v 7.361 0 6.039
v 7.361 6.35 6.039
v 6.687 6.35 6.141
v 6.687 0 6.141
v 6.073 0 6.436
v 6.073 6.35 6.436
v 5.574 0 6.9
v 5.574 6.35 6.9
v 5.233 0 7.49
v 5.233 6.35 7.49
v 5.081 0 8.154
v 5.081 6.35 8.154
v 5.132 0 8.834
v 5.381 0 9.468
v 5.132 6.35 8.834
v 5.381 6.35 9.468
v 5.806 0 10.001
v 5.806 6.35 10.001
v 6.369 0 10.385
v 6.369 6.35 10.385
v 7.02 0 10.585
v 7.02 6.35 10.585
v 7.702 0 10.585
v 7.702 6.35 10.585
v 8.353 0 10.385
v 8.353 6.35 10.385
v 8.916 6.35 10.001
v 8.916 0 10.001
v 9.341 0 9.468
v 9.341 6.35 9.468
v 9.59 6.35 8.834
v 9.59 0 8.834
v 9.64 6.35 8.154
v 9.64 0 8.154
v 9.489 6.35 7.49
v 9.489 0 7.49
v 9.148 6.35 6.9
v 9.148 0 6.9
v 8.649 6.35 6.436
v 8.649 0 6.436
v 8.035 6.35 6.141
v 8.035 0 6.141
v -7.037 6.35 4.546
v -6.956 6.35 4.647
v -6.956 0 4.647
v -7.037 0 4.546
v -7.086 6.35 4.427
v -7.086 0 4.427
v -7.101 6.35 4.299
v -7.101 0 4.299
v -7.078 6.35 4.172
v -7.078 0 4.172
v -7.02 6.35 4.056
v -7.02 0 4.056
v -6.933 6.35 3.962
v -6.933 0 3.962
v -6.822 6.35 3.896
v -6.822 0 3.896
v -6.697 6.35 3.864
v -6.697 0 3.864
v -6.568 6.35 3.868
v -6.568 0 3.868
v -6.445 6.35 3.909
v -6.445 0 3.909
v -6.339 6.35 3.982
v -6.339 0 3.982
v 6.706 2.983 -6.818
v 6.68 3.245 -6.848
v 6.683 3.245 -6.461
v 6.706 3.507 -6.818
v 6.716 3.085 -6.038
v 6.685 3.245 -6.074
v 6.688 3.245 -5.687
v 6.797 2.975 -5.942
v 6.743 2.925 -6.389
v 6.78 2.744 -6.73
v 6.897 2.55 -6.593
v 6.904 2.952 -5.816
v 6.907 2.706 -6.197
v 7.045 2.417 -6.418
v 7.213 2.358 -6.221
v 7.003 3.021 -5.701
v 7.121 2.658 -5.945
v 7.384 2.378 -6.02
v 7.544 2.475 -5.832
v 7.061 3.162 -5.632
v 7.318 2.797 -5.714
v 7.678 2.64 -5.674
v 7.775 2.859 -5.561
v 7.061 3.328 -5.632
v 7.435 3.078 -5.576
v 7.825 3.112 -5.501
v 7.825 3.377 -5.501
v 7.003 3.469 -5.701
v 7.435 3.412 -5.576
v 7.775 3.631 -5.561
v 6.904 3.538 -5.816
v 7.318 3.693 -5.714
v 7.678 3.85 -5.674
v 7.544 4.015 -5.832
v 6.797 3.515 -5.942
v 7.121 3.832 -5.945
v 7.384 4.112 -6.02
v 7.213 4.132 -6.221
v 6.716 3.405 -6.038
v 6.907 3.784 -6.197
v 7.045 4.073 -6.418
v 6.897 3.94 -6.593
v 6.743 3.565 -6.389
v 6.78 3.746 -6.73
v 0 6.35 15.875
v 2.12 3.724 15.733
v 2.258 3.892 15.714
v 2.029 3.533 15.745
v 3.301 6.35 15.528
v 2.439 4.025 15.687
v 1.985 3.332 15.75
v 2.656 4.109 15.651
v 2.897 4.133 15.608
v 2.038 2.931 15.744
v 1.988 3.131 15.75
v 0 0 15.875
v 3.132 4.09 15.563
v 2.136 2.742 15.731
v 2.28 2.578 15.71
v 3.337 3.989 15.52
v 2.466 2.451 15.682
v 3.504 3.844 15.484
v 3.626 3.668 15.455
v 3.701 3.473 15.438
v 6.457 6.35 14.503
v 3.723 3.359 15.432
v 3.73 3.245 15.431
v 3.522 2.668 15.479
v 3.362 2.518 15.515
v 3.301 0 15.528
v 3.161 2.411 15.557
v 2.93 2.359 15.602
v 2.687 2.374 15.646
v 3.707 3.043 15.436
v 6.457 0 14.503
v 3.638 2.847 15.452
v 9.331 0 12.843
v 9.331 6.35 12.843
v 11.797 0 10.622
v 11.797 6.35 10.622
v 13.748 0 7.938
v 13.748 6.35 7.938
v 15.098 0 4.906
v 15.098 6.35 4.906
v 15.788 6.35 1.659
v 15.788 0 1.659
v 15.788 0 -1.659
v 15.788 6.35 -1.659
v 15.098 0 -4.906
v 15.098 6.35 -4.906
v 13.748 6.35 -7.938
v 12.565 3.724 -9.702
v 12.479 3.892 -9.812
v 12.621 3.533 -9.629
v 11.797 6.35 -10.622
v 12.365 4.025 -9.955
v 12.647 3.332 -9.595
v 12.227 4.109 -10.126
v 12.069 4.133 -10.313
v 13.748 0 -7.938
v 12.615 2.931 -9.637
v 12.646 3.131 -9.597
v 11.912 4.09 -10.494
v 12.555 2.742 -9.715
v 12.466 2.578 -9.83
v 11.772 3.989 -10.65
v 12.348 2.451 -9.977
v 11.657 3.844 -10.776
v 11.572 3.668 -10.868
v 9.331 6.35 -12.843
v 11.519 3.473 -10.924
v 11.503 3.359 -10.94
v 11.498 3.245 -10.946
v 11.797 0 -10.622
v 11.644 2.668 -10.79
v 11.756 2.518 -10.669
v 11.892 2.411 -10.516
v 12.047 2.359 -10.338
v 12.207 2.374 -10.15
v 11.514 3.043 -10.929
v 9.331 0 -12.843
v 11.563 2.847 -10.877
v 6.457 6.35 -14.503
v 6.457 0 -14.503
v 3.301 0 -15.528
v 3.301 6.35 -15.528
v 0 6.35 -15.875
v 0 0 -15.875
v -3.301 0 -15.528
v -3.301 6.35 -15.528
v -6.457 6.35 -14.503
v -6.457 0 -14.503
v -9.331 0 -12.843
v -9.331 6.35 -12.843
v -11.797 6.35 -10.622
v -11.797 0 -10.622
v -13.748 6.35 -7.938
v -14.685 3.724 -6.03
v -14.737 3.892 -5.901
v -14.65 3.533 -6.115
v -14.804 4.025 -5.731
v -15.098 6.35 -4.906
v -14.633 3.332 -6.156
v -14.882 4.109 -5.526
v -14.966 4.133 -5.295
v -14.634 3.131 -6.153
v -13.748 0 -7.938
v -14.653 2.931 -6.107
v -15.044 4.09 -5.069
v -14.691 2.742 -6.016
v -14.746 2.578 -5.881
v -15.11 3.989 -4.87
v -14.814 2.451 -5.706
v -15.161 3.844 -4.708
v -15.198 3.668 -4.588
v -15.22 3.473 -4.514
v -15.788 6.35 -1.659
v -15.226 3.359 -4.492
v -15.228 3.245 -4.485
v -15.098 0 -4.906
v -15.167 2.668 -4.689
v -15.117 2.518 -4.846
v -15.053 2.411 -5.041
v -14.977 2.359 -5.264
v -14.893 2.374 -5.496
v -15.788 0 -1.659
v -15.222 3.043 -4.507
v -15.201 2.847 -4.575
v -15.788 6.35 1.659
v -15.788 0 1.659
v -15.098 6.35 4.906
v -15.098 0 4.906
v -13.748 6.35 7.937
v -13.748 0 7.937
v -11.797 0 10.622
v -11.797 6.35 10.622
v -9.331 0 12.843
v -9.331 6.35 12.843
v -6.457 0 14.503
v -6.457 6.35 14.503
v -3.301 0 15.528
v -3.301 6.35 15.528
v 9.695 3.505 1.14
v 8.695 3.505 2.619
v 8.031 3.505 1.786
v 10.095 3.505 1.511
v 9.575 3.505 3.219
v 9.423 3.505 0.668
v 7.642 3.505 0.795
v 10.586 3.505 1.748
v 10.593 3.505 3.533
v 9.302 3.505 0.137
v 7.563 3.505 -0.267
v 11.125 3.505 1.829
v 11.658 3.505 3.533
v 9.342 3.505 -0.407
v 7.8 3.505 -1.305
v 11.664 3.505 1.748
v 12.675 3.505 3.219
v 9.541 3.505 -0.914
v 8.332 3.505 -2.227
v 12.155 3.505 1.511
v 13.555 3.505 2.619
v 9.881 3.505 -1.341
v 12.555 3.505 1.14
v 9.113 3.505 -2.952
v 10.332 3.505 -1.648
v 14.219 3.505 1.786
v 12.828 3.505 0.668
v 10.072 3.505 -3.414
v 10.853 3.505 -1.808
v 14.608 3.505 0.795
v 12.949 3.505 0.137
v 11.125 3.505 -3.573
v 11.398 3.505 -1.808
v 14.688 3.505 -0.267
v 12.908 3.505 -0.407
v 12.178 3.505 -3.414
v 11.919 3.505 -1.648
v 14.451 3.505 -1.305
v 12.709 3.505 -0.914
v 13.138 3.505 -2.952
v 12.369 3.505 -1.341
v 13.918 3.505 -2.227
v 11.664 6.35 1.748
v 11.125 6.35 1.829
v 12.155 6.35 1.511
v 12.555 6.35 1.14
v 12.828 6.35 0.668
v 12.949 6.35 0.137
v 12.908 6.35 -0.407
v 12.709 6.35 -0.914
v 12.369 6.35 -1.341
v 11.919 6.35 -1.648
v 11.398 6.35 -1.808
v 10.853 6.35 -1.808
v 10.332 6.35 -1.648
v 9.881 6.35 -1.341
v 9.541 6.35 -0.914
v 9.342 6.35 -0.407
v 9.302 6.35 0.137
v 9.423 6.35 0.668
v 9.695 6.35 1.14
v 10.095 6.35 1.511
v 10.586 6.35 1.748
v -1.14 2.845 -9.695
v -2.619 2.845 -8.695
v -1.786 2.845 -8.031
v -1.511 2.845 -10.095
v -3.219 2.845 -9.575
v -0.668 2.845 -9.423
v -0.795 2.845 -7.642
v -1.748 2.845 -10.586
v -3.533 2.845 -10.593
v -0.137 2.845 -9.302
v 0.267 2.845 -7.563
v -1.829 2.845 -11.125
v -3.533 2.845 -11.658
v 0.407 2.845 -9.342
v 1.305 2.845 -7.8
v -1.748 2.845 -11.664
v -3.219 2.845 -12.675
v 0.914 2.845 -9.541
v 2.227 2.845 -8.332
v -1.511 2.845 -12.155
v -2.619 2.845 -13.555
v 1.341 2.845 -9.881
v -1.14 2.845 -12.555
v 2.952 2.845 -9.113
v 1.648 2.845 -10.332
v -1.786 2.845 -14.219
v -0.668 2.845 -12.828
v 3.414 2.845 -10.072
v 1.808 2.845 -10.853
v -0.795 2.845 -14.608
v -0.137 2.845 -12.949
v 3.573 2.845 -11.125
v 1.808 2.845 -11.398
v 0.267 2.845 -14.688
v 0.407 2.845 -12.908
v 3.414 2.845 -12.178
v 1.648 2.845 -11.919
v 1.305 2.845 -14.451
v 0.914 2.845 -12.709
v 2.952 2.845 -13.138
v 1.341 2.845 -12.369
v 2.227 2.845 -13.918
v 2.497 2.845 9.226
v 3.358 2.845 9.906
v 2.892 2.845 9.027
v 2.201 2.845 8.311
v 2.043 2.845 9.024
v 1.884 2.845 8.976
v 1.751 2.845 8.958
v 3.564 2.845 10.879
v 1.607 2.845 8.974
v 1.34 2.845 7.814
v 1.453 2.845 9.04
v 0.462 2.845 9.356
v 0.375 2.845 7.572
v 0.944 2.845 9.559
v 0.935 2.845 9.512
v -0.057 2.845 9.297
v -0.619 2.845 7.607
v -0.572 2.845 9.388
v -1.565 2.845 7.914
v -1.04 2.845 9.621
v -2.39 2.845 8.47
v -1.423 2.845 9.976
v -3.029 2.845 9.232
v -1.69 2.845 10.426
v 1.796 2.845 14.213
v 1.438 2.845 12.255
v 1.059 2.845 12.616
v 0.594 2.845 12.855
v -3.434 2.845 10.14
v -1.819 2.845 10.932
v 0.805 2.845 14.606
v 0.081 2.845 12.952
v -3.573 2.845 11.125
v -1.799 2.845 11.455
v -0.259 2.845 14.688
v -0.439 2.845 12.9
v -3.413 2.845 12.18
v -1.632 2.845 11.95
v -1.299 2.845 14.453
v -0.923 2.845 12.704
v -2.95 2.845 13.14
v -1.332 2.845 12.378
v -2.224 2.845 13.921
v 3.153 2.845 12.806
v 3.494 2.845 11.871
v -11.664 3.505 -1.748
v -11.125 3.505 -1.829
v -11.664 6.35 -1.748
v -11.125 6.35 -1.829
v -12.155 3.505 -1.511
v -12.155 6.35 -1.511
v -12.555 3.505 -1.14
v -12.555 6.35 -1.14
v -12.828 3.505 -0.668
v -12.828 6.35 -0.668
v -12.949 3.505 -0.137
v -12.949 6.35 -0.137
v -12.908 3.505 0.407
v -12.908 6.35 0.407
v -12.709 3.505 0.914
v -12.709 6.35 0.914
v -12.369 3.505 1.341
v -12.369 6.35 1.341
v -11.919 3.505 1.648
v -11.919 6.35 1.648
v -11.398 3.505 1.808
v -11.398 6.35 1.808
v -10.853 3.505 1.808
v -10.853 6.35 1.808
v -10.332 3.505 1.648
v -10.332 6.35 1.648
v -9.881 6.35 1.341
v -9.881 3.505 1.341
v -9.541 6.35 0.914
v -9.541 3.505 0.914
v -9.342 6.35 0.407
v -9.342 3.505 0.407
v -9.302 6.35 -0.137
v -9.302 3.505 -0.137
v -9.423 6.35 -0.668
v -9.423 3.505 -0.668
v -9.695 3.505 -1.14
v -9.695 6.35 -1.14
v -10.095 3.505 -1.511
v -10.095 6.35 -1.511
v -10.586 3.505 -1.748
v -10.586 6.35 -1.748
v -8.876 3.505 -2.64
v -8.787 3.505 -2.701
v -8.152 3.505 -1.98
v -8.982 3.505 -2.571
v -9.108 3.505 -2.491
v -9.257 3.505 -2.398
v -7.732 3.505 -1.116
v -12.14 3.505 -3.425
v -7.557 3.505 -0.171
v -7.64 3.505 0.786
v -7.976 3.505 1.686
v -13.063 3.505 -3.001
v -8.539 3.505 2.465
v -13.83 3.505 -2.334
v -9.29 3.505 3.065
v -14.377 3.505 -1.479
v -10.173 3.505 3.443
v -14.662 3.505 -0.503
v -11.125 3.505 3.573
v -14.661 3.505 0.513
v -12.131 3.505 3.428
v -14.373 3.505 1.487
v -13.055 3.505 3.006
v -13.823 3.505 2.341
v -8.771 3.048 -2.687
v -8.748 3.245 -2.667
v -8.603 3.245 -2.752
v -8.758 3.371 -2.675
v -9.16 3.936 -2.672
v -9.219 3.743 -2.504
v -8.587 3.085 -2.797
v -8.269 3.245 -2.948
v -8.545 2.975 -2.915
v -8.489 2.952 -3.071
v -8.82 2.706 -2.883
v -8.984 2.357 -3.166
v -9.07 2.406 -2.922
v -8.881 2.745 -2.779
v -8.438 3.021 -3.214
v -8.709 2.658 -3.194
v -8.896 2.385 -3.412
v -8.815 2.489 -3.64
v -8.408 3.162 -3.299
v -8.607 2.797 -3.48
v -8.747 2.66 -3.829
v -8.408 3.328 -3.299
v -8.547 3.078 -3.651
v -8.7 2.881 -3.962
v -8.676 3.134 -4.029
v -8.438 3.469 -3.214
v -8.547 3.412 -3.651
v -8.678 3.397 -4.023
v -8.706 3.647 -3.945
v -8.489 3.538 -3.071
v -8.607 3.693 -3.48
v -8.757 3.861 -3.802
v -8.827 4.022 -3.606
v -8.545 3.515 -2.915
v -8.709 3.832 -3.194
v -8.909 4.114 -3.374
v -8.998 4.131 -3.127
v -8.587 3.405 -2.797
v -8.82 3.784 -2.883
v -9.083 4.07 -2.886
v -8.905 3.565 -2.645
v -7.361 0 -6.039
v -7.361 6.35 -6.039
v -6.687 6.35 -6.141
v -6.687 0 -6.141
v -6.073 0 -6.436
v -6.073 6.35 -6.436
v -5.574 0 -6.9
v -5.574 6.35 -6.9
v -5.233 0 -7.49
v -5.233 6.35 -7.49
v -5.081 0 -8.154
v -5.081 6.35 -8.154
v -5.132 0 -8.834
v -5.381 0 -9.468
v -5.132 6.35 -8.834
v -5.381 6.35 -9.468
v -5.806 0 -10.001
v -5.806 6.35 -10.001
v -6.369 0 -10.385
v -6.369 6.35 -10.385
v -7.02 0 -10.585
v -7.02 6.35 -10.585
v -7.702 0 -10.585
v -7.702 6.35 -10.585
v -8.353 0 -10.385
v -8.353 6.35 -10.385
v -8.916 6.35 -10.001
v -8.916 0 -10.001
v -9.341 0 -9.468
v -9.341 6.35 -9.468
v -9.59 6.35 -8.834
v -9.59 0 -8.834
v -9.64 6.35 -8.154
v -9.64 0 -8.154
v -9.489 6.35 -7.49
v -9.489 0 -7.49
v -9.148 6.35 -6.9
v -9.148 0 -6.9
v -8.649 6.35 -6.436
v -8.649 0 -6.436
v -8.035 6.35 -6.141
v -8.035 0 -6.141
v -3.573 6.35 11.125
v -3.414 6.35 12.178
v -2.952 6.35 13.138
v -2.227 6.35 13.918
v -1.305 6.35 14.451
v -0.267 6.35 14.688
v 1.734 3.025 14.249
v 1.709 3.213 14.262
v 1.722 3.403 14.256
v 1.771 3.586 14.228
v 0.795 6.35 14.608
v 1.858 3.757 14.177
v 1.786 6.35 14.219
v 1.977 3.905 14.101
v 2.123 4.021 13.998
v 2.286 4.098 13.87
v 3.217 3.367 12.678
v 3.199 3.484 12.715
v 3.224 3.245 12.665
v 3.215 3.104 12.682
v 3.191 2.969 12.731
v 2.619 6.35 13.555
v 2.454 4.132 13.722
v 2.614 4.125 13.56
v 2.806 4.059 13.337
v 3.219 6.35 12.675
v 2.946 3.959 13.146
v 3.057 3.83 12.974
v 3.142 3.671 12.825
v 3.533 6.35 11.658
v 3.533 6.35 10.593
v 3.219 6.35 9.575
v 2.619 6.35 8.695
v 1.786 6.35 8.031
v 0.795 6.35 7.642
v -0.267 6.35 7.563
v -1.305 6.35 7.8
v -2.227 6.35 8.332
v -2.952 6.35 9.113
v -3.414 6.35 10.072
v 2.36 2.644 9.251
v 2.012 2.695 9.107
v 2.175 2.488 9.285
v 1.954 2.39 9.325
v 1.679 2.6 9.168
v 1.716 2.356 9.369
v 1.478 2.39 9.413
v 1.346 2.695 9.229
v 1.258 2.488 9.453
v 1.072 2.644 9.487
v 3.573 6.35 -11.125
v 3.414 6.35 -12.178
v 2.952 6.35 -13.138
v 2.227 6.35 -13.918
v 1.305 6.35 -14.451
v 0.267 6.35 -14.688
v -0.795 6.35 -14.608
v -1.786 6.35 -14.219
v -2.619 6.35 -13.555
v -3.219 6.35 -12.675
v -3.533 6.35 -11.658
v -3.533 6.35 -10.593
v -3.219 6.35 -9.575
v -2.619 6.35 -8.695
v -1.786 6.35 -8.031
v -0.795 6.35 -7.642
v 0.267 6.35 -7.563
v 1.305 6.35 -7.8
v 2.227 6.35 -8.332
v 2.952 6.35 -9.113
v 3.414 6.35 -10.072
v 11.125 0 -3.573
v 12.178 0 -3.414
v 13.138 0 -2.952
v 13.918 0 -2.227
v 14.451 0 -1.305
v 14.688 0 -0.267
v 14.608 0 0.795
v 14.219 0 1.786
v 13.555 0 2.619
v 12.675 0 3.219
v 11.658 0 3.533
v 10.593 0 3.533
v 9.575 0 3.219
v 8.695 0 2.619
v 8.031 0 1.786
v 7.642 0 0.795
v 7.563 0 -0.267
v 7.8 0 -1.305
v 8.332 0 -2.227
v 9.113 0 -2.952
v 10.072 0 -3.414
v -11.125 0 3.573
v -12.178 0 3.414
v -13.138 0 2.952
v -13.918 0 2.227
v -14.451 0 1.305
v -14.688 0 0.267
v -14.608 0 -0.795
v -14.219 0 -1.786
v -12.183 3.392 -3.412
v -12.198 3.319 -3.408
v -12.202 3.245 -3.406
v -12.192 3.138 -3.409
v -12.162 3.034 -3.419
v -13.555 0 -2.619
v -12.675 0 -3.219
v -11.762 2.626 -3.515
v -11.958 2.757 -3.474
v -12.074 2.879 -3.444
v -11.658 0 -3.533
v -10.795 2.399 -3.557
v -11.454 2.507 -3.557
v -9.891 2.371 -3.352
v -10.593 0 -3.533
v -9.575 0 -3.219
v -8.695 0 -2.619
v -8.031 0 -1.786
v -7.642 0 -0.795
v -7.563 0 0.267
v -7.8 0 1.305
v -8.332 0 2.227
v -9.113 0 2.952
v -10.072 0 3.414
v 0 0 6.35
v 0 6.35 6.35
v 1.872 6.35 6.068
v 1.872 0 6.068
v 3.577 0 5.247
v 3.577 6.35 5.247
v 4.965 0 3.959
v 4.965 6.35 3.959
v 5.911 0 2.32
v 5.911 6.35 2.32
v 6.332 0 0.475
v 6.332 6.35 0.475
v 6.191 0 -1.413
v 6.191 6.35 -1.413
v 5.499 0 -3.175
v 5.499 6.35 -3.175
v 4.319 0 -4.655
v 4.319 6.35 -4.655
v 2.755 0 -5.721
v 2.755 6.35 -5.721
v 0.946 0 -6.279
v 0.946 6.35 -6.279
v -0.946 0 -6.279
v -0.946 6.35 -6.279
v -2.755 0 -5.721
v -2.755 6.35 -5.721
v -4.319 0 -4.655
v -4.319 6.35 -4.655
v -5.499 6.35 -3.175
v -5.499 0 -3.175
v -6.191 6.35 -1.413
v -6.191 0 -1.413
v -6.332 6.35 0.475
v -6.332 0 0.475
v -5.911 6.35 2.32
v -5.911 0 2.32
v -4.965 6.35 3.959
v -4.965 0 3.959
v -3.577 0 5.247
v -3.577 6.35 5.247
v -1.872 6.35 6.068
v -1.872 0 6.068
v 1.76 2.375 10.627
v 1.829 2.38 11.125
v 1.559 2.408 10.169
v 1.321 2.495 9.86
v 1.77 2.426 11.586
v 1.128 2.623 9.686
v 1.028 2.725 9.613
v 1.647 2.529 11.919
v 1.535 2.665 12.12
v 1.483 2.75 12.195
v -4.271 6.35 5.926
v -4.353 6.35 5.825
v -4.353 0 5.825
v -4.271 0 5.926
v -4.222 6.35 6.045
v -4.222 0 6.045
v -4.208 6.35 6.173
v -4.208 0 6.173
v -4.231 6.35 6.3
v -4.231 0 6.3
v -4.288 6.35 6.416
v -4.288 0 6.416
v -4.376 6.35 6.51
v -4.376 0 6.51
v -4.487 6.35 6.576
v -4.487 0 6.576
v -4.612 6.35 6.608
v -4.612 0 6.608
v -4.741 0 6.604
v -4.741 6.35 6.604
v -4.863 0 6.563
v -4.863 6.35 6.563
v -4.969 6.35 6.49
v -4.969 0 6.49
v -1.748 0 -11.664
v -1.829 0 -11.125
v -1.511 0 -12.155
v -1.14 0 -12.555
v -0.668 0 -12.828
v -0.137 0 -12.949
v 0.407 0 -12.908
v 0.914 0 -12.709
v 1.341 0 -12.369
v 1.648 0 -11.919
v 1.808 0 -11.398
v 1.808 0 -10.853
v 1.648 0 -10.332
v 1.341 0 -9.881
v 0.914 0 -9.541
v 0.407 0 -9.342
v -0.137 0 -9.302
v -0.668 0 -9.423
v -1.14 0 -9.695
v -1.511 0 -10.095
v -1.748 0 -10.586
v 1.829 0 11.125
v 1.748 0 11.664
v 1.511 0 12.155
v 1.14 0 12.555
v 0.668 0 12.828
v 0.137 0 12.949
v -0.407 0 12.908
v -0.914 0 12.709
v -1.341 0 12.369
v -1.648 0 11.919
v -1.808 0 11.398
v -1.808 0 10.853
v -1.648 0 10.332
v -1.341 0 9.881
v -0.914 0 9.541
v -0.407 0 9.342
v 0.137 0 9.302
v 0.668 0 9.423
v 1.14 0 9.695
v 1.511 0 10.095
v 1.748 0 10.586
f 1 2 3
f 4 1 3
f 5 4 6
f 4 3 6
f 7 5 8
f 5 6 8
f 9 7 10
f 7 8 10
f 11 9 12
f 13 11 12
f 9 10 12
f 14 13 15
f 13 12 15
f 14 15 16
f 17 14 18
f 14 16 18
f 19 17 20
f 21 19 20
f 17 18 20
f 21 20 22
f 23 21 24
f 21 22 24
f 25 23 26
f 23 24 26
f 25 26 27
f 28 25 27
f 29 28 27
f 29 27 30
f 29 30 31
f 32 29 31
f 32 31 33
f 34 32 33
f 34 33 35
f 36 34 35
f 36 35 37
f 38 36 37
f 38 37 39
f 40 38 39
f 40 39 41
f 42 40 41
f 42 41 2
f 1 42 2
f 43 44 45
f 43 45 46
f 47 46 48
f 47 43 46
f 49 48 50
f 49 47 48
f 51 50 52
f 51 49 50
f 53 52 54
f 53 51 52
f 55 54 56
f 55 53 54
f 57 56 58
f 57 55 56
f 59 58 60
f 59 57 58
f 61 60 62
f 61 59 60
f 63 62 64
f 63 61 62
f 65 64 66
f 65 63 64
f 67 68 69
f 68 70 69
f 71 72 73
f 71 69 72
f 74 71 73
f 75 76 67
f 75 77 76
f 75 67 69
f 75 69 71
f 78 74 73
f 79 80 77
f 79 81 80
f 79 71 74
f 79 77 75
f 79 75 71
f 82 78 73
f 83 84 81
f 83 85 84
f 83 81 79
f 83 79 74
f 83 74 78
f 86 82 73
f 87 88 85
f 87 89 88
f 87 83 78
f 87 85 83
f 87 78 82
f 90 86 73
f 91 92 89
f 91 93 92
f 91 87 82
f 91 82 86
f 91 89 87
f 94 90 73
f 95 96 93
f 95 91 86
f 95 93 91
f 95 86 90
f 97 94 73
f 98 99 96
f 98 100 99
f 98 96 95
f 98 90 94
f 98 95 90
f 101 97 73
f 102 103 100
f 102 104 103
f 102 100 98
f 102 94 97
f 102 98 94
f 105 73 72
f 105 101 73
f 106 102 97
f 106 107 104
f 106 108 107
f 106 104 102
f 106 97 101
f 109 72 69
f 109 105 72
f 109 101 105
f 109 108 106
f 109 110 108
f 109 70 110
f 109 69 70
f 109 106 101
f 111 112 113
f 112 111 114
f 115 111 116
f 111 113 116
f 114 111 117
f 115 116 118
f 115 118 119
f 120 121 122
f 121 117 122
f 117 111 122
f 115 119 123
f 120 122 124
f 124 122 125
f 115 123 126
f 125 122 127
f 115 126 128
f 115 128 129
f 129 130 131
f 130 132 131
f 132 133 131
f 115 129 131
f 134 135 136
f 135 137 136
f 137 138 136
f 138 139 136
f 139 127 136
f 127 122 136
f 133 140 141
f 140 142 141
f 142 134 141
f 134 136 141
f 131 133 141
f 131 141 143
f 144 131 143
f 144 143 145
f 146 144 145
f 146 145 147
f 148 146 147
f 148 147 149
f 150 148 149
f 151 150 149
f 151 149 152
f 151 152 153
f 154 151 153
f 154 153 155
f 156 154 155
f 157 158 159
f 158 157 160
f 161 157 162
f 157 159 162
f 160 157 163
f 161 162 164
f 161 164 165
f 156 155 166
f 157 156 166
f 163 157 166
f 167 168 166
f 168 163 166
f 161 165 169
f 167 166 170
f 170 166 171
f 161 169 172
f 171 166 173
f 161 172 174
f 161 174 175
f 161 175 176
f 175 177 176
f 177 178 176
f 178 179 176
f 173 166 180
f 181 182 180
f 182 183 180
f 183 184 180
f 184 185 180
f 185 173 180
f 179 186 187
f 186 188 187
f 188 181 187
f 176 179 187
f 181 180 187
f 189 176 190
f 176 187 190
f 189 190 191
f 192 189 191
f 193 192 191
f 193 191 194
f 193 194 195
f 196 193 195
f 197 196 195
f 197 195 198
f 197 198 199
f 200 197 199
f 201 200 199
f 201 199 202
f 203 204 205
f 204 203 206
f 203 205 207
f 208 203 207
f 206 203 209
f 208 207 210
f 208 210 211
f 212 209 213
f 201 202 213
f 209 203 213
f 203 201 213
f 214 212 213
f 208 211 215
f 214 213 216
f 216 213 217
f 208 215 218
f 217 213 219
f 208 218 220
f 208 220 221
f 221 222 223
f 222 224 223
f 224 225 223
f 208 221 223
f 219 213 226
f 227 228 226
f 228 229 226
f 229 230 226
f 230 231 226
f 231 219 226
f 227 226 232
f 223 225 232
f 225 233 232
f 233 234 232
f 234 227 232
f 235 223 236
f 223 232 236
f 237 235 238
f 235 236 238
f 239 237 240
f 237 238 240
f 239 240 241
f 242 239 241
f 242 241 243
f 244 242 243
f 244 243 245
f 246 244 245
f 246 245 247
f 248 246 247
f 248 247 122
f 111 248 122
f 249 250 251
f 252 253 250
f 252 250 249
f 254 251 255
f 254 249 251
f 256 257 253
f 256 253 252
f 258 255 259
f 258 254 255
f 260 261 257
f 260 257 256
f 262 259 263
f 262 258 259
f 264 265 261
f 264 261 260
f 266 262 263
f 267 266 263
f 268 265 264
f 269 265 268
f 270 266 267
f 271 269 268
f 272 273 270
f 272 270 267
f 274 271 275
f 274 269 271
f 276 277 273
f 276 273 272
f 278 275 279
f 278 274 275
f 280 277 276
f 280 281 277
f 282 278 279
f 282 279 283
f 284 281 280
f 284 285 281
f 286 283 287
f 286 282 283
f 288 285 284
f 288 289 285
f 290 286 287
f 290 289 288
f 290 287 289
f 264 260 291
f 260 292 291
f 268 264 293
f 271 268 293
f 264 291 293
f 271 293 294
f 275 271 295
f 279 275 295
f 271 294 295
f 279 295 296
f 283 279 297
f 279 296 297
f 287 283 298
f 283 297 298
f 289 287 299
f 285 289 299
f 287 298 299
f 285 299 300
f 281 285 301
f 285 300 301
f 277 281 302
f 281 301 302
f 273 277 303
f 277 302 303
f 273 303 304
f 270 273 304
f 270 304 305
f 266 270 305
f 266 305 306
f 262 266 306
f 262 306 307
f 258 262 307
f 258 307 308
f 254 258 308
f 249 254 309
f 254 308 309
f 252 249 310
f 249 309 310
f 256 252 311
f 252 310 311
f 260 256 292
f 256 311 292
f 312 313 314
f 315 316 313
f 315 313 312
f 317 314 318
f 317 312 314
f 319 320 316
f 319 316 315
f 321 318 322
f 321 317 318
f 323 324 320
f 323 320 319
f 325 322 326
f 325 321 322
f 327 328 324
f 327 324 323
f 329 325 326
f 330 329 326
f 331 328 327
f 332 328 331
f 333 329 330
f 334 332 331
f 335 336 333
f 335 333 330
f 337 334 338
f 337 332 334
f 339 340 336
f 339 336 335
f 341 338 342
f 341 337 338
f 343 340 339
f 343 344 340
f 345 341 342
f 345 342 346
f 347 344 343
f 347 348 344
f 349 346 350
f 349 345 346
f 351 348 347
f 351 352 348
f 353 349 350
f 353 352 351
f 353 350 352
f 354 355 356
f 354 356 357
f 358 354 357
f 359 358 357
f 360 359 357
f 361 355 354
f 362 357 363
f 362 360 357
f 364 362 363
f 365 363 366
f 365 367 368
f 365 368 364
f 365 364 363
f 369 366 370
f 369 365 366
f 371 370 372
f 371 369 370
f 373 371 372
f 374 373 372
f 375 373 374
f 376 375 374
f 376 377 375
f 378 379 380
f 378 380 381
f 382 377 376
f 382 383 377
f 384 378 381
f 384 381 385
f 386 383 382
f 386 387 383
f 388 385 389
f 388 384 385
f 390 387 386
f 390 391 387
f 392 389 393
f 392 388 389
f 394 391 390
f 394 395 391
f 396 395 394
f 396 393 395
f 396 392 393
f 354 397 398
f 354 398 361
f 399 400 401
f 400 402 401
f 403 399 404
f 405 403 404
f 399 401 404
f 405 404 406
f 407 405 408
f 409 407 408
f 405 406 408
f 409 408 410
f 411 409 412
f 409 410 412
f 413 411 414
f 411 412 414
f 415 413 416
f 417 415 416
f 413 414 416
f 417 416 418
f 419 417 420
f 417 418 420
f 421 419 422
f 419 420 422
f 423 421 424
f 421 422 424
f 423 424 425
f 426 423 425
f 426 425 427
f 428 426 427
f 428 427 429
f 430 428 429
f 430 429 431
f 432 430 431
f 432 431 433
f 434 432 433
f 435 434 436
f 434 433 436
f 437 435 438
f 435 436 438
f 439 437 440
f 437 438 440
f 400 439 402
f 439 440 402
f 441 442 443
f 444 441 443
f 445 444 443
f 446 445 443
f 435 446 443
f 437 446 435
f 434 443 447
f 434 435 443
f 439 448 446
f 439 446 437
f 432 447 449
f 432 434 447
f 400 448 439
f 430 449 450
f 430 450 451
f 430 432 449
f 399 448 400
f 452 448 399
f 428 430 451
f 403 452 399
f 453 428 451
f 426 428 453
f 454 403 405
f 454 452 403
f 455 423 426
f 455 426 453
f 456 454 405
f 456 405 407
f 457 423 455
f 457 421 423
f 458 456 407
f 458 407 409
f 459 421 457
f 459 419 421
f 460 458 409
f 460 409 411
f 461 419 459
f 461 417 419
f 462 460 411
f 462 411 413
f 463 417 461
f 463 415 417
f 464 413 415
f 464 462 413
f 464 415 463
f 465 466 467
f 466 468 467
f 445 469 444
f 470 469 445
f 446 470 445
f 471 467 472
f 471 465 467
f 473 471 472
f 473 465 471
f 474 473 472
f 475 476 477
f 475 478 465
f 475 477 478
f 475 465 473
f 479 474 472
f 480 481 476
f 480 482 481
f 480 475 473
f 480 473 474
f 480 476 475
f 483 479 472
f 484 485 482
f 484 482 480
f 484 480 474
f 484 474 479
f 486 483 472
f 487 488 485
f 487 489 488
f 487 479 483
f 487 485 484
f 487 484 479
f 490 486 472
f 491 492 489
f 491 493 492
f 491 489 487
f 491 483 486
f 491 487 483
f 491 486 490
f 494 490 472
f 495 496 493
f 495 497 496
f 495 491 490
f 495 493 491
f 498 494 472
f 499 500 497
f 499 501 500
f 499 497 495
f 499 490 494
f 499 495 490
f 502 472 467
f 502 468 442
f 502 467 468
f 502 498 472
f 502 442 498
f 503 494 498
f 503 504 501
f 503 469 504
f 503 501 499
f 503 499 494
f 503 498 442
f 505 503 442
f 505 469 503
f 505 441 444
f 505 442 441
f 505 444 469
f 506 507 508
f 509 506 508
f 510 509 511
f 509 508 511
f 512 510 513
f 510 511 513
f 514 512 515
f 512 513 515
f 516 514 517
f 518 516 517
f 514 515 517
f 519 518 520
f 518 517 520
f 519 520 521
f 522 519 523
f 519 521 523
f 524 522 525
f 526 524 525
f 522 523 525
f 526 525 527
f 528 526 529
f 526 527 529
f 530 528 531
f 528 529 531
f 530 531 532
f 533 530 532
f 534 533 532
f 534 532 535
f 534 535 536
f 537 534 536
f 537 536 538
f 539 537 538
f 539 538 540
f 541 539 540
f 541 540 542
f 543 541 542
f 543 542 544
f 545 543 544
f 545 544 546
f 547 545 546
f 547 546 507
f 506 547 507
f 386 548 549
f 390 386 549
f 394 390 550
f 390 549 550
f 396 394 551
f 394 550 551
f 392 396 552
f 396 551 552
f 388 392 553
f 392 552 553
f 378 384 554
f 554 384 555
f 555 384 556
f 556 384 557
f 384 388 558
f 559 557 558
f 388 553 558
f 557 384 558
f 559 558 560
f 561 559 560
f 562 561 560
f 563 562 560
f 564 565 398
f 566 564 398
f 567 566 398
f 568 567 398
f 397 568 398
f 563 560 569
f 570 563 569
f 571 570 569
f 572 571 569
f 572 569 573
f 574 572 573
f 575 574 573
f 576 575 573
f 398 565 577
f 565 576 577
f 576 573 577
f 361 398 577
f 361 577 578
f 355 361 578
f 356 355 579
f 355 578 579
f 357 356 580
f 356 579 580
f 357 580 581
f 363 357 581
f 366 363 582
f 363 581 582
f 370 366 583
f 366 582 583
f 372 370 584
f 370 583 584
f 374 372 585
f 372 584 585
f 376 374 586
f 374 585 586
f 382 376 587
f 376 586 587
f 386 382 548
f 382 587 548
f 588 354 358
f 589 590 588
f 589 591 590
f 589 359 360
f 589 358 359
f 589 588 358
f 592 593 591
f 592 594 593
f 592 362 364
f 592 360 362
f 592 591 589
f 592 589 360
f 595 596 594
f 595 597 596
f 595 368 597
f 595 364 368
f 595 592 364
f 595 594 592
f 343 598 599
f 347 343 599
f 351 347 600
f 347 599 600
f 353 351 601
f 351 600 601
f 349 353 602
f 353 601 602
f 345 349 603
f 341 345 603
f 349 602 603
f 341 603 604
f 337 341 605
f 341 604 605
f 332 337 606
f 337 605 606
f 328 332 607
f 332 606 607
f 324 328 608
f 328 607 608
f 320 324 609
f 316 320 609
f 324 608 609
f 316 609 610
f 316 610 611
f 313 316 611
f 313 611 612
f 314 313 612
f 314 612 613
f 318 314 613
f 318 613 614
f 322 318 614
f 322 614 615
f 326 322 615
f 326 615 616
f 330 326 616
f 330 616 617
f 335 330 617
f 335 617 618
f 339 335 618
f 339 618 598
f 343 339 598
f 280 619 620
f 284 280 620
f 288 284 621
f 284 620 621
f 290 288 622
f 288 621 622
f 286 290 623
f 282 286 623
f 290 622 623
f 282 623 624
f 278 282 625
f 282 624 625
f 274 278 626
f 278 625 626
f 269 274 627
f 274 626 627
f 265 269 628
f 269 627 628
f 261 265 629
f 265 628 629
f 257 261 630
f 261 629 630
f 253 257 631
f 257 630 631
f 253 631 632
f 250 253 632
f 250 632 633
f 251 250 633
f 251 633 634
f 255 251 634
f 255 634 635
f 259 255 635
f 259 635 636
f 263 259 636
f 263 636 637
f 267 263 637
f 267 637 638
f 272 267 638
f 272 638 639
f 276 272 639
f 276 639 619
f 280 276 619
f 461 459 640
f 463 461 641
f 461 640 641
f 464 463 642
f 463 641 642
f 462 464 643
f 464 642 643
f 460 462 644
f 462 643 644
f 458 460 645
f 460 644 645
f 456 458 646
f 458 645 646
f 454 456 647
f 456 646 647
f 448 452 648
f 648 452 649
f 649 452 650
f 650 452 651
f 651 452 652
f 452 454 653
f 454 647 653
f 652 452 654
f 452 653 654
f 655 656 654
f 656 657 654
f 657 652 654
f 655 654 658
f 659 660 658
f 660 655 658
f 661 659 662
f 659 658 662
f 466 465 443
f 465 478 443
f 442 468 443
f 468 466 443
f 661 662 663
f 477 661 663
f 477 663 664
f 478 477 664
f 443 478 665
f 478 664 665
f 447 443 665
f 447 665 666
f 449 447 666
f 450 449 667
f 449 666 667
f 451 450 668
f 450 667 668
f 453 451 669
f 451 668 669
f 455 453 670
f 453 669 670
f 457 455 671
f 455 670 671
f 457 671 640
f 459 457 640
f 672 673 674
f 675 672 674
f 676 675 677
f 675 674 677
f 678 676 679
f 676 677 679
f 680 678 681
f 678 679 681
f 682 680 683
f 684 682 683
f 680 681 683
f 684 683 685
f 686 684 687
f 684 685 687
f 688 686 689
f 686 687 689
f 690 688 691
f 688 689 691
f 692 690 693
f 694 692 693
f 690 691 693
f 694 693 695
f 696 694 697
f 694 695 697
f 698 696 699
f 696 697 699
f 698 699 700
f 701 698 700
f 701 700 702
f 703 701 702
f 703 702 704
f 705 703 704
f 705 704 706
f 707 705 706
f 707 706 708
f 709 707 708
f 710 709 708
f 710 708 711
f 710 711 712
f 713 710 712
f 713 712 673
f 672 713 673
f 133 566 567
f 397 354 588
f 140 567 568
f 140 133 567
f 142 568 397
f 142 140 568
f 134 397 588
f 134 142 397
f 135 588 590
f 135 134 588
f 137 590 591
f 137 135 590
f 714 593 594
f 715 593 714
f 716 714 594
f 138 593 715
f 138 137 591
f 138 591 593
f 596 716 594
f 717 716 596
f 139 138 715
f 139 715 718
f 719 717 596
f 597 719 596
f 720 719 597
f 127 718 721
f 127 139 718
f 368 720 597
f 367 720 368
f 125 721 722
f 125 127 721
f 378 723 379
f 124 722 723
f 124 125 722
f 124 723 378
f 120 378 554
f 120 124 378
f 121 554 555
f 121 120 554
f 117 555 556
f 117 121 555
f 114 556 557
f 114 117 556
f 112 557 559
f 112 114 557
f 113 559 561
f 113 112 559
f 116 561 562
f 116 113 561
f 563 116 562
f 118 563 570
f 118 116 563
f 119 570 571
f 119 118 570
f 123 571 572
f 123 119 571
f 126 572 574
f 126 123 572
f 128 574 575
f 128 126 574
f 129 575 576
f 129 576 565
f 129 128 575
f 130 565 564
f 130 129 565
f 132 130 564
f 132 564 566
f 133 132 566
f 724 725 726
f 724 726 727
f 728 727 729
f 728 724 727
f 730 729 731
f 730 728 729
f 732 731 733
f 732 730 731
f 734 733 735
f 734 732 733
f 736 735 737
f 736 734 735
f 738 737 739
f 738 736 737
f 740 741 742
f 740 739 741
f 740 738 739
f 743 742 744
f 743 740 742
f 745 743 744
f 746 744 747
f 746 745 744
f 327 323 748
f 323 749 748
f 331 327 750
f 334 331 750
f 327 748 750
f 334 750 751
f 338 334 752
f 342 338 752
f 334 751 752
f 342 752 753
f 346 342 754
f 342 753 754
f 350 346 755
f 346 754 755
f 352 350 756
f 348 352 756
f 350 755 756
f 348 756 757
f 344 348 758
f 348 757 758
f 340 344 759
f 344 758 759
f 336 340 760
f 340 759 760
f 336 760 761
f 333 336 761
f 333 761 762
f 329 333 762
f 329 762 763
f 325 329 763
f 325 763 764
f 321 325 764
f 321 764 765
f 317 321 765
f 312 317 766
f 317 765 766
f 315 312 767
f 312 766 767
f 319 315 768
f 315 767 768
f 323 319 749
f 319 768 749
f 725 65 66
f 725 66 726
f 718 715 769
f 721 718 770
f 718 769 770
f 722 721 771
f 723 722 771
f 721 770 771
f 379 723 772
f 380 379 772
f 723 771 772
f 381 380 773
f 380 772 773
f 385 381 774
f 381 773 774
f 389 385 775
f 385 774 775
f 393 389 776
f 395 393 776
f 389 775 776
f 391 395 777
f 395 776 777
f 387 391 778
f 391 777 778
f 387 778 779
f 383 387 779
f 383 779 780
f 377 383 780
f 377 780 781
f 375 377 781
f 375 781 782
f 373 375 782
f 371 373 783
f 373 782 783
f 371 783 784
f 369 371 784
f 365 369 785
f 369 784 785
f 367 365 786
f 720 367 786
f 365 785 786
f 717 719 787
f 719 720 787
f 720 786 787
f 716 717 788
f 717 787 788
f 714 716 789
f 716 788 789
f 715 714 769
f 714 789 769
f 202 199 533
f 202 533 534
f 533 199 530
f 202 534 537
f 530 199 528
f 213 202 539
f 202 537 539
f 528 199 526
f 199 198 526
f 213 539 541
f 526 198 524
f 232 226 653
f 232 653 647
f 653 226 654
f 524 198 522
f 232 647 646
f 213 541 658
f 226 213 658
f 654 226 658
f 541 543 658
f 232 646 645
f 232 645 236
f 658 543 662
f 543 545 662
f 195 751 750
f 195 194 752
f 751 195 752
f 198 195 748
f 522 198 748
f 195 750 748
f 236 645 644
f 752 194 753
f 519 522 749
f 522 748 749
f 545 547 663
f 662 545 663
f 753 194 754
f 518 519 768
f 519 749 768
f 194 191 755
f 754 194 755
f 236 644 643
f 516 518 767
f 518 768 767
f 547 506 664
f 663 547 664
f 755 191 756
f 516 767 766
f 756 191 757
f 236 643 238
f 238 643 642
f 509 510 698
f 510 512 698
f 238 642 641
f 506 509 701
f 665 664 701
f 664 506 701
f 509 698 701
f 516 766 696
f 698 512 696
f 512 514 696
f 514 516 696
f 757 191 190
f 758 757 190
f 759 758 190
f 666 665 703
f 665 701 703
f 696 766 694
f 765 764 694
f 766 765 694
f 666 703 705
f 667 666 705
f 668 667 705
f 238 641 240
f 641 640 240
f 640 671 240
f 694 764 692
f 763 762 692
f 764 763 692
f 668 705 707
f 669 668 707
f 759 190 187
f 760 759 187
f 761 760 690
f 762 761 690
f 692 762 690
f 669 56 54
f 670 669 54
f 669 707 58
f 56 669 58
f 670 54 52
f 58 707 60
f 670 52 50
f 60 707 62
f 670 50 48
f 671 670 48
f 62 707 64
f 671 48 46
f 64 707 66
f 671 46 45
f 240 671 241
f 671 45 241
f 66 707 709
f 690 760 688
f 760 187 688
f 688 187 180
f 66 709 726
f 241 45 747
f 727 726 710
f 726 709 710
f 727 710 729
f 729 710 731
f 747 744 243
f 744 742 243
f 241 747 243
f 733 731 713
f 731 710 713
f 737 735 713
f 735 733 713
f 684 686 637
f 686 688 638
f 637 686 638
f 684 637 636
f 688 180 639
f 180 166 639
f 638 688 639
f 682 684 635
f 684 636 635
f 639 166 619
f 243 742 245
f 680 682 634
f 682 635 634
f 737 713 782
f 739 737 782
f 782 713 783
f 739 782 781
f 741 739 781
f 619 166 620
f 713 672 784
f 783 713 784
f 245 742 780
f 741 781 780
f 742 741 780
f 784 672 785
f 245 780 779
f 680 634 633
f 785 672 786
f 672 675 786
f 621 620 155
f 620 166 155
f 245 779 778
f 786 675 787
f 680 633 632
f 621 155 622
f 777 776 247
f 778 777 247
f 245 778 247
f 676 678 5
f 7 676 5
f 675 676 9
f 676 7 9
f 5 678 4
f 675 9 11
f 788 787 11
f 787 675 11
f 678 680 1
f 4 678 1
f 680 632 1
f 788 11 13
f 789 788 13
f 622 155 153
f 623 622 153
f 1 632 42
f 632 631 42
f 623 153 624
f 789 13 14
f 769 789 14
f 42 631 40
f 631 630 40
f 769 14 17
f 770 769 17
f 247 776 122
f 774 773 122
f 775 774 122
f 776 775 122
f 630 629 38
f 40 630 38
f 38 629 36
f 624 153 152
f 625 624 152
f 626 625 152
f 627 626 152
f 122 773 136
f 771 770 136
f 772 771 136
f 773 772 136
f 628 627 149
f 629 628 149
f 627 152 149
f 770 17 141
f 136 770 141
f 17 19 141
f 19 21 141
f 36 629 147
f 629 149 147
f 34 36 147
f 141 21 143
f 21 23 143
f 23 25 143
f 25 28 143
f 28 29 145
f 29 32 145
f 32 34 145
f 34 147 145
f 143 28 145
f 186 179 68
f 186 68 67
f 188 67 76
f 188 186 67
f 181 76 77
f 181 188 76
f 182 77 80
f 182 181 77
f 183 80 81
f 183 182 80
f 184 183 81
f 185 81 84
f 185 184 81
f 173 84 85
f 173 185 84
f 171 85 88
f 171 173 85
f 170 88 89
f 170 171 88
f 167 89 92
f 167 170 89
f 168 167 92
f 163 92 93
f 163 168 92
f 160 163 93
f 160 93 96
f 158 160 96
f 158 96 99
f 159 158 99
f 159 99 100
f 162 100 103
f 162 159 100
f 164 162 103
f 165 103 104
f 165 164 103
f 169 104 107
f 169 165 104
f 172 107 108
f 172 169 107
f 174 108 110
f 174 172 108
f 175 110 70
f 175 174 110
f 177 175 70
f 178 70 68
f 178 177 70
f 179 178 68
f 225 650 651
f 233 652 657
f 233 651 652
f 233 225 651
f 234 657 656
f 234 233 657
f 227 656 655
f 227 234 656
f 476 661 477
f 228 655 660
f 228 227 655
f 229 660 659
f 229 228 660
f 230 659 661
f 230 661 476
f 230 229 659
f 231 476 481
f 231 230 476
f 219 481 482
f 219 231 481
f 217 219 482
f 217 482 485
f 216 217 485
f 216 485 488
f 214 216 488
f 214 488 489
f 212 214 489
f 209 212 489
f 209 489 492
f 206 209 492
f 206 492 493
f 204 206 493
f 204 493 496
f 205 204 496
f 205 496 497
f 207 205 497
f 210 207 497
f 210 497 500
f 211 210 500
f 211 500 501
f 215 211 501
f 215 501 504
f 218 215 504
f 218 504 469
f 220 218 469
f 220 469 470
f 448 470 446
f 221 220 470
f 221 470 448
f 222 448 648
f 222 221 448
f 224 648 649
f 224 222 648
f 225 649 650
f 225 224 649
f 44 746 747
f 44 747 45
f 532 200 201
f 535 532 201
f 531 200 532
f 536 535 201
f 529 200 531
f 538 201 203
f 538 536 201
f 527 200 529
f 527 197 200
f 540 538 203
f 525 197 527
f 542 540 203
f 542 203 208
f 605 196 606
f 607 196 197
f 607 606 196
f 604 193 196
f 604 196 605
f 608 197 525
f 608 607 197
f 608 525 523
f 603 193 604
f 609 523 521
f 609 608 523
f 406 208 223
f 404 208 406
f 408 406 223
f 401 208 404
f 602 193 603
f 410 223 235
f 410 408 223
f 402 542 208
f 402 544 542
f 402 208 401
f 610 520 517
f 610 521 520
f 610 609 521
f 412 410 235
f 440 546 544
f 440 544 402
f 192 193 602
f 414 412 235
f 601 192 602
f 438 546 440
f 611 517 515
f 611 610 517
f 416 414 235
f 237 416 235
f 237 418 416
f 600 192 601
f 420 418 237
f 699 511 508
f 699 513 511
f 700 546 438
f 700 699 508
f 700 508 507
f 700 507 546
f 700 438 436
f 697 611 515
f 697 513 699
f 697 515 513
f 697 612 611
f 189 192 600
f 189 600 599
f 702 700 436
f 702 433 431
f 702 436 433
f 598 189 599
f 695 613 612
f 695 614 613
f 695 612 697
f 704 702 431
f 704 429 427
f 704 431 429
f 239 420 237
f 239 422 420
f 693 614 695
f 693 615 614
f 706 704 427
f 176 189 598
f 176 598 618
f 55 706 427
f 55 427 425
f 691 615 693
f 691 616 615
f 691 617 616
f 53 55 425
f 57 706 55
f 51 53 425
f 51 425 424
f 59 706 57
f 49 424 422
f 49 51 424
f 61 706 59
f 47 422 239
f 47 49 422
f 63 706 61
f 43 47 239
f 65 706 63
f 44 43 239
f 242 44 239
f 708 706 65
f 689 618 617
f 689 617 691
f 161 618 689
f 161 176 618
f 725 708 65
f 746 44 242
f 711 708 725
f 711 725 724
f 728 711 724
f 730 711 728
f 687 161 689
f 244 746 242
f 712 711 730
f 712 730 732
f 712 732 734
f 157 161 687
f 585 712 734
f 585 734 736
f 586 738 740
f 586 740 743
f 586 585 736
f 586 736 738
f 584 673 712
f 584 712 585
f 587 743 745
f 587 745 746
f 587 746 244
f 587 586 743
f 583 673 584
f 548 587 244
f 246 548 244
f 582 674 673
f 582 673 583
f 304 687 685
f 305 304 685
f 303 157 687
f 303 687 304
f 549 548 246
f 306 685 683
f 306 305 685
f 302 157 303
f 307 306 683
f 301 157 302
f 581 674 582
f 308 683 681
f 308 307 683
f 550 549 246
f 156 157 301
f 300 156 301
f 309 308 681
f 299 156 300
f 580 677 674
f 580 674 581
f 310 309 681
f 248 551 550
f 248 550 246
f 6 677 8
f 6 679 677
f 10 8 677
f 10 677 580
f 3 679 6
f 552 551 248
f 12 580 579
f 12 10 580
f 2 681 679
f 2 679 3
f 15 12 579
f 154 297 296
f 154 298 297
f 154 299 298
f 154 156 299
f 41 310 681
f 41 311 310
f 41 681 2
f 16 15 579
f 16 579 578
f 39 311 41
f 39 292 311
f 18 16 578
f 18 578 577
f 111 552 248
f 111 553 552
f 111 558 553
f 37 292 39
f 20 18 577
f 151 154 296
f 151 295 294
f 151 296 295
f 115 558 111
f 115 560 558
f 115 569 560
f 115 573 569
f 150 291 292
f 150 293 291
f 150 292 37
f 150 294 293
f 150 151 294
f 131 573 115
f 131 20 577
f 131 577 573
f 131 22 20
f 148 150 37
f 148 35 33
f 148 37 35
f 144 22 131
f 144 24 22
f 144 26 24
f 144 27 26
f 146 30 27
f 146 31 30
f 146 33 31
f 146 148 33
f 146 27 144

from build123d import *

# Parameters (mm, degrees)
SKETCH1_R                                      = 15.875
BOSS_EXTRUDE1_DEPTH                            = 6.35
SKETCH2_R                                      = 6.35
CUT_EXTRUDE1_DEPTH                             = 24.3313898
CBORE_FOR_6_SOCKET_HEAD_CAP_SCREW1_D           = 3.6576
CBORE_FOR_6_SOCKET_HEAD_CAP_SCREW1_CBORE_D     = 7.14502
CBORE_FOR_6_SOCKET_HEAD_CAP_SCREW1_CBORE_DEPTH = 3.5052
CIRPATTERN1_COUNT                              = 2
SKETCH11_R                                     = 2.286
CUT_EXTRUDE2_DEPTH                             = 24.3313898
CIRPATTERN3_COUNT                              = 2
CIRPATTERN4_COUNT                              = 3
CUT_EXTRUDE3_DEPTH                             = 24.331389963
CBORE_FOR_6_SOCKET_HEAD_CAP_SCREW2_D           = 3.6576
CBORE_FOR_6_SOCKET_HEAD_CAP_SCREW2_CBORE_D     = 7.14502
CBORE_FOR_6_SOCKET_HEAD_CAP_SCREW2_CBORE_DEPTH = 3.5052
CIRPATTERN5_COUNT                              = 2


with BuildPart() as part:
    # Sketch1 → Boss-Extrude1 (new body)
    with BuildSketch(Plane(origin=(0, 0, 0), x_dir=(1, 0, 0), z_dir=(0, 1, 0))):
        with Locations(Location((0, 0, 0), (0, 0, 270))):
            Circle(SKETCH1_R)
    extrude(amount=BOSS_EXTRUDE1_DEPTH)

    # Sketch2 → Cut-Extrude1 (cut, through all)
    with BuildSketch(Plane(origin=(0, 6.35, 0), x_dir=(1, 0, 0), z_dir=(0, 1, 0))):
        with Locations(Location((0, 0, 0), (0, 0, 270))):
            Circle(SKETCH2_R)
    extrude(amount=-CUT_EXTRUDE1_DEPTH, mode=Mode.SUBTRACT)

    # CBORE for #6 Socket Head Cap Screw1 (through all)
    with Locations(Plane(origin=(0, 6.35, 0), x_dir=(1, 0, 0), z_dir=(0, 1, 0))):
        with Locations((0, 11.1252)):
            cbore_for_6_socket_head_cap_screw1 = CounterBoreHole(CBORE_FOR_6_SOCKET_HEAD_CAP_SCREW1_D / 2, CBORE_FOR_6_SOCKET_HEAD_CAP_SCREW1_CBORE_D / 2, CBORE_FOR_6_SOCKET_HEAD_CAP_SCREW1_CBORE_DEPTH)

    # CirPattern1: CBORE for #6 Socket Head Cap Screw1 ×2 about axis
    cirpattern1_axis = Axis((0, 0, 0), (0, 1, 0))
    for i in range(1, CIRPATTERN1_COUNT):
        add(cbore_for_6_socket_head_cap_screw1.rotate(cirpattern1_axis, i * 360 / CIRPATTERN1_COUNT), mode=Mode.SUBTRACT)

    # Sketch11 → Cut-Extrude2 (cut, through all)
    with BuildSketch(Plane(origin=(0, 6.35, 0), x_dir=(1, 0, 0), z_dir=(0, 1, 0))):
        with Locations(Location((-7.360856908, 8.324988999, 0), (0, 0, 270))):
            Circle(SKETCH11_R)
    cut_extrude2 = extrude(amount=-CUT_EXTRUDE2_DEPTH, mode=Mode.SUBTRACT)

    # CirPattern3: Cut-Extrude2 ×2 about axis
    cirpattern3_axis = Axis((0, 0, 0), (0, 1, 0))
    for i in range(1, CIRPATTERN3_COUNT):
        add(cut_extrude2.rotate(cirpattern3_axis, i * 360 / CIRPATTERN3_COUNT), mode=Mode.SUBTRACT)

    # Sketch16 → Tap Drill for #2-56 Tap3 (revolve, cut)
    with BuildSketch(Plane(origin=(12.093135875, 3.244987275, -10.284536436), x_dir=(-0.6478448148472237, 0, -0.7617723386127685), z_dir=(0, 1, 0))):
        Polygon((0, 0), (0, 7.095959572), (0.889, 6.35), (0.889, 0), align=None)
    tap_drill_for_2_56_tap3 = revolve(axis=Axis((16.930390226, 3.244987275, -14.39835101), (-0.7617723386127686, 0, 0.6478448148472237)), mode=Mode.SUBTRACT)

    # CirPattern4: Tap Drill for #2-56 Tap3 ×3 about axis
    cirpattern4_axis = Axis((0, 6.35, 0), (0, -1, 0))
    for i in range(1, CIRPATTERN4_COUNT):
        add(tap_drill_for_2_56_tap3.rotate(cirpattern4_axis, i * 360 / CIRPATTERN4_COUNT), mode=Mode.SUBTRACT)

    # Sketch17 → Cut-Extrude3 (cut, through all)
    with BuildSketch(Plane(origin=(0, 6.35, 0), x_dir=(1, 0, 0), z_dir=(0, 1, 0))):
        with BuildLine():
            Line((-4.96914615, -6.489934512), (-6.955810814, -4.646503161))
            ThreePointArc((-6.955810814, -4.646503161), (-6.979764598, -4.005972756), (-6.339234193, -3.982018972))
            Line((-6.339234193, -3.982018972), (-4.352569529, -5.825450323))
            ThreePointArc((-4.352569529, -5.825450323), (-4.328615745, -6.465980728), (-4.96914615, -6.489934512))
        make_face()
    extrude(amount=-CUT_EXTRUDE3_DEPTH, mode=Mode.SUBTRACT)

    # CBORE for #6 Socket Head Cap Screw2 (through all)
    with Locations(Plane(origin=(11.1252, 0, 0), x_dir=(0, 0, -1), z_dir=(0, -1, 0))):
        with Locations((0, 0)):
            cbore_for_6_socket_head_cap_screw2 = CounterBoreHole(CBORE_FOR_6_SOCKET_HEAD_CAP_SCREW2_D / 2, CBORE_FOR_6_SOCKET_HEAD_CAP_SCREW2_CBORE_D / 2, CBORE_FOR_6_SOCKET_HEAD_CAP_SCREW2_CBORE_DEPTH)

    # CirPattern5: CBORE for #6 Socket Head Cap Screw2 ×2 about axis
    cirpattern5_axis = Axis((0, 0, 0), (0, 1, 0))
    for i in range(1, CIRPATTERN5_COUNT):
        add(cbore_for_6_socket_head_cap_screw2.rotate(cirpattern5_axis, i * 360 / CIRPATTERN5_COUNT), mode=Mode.SUBTRACT)


solid = part.part
